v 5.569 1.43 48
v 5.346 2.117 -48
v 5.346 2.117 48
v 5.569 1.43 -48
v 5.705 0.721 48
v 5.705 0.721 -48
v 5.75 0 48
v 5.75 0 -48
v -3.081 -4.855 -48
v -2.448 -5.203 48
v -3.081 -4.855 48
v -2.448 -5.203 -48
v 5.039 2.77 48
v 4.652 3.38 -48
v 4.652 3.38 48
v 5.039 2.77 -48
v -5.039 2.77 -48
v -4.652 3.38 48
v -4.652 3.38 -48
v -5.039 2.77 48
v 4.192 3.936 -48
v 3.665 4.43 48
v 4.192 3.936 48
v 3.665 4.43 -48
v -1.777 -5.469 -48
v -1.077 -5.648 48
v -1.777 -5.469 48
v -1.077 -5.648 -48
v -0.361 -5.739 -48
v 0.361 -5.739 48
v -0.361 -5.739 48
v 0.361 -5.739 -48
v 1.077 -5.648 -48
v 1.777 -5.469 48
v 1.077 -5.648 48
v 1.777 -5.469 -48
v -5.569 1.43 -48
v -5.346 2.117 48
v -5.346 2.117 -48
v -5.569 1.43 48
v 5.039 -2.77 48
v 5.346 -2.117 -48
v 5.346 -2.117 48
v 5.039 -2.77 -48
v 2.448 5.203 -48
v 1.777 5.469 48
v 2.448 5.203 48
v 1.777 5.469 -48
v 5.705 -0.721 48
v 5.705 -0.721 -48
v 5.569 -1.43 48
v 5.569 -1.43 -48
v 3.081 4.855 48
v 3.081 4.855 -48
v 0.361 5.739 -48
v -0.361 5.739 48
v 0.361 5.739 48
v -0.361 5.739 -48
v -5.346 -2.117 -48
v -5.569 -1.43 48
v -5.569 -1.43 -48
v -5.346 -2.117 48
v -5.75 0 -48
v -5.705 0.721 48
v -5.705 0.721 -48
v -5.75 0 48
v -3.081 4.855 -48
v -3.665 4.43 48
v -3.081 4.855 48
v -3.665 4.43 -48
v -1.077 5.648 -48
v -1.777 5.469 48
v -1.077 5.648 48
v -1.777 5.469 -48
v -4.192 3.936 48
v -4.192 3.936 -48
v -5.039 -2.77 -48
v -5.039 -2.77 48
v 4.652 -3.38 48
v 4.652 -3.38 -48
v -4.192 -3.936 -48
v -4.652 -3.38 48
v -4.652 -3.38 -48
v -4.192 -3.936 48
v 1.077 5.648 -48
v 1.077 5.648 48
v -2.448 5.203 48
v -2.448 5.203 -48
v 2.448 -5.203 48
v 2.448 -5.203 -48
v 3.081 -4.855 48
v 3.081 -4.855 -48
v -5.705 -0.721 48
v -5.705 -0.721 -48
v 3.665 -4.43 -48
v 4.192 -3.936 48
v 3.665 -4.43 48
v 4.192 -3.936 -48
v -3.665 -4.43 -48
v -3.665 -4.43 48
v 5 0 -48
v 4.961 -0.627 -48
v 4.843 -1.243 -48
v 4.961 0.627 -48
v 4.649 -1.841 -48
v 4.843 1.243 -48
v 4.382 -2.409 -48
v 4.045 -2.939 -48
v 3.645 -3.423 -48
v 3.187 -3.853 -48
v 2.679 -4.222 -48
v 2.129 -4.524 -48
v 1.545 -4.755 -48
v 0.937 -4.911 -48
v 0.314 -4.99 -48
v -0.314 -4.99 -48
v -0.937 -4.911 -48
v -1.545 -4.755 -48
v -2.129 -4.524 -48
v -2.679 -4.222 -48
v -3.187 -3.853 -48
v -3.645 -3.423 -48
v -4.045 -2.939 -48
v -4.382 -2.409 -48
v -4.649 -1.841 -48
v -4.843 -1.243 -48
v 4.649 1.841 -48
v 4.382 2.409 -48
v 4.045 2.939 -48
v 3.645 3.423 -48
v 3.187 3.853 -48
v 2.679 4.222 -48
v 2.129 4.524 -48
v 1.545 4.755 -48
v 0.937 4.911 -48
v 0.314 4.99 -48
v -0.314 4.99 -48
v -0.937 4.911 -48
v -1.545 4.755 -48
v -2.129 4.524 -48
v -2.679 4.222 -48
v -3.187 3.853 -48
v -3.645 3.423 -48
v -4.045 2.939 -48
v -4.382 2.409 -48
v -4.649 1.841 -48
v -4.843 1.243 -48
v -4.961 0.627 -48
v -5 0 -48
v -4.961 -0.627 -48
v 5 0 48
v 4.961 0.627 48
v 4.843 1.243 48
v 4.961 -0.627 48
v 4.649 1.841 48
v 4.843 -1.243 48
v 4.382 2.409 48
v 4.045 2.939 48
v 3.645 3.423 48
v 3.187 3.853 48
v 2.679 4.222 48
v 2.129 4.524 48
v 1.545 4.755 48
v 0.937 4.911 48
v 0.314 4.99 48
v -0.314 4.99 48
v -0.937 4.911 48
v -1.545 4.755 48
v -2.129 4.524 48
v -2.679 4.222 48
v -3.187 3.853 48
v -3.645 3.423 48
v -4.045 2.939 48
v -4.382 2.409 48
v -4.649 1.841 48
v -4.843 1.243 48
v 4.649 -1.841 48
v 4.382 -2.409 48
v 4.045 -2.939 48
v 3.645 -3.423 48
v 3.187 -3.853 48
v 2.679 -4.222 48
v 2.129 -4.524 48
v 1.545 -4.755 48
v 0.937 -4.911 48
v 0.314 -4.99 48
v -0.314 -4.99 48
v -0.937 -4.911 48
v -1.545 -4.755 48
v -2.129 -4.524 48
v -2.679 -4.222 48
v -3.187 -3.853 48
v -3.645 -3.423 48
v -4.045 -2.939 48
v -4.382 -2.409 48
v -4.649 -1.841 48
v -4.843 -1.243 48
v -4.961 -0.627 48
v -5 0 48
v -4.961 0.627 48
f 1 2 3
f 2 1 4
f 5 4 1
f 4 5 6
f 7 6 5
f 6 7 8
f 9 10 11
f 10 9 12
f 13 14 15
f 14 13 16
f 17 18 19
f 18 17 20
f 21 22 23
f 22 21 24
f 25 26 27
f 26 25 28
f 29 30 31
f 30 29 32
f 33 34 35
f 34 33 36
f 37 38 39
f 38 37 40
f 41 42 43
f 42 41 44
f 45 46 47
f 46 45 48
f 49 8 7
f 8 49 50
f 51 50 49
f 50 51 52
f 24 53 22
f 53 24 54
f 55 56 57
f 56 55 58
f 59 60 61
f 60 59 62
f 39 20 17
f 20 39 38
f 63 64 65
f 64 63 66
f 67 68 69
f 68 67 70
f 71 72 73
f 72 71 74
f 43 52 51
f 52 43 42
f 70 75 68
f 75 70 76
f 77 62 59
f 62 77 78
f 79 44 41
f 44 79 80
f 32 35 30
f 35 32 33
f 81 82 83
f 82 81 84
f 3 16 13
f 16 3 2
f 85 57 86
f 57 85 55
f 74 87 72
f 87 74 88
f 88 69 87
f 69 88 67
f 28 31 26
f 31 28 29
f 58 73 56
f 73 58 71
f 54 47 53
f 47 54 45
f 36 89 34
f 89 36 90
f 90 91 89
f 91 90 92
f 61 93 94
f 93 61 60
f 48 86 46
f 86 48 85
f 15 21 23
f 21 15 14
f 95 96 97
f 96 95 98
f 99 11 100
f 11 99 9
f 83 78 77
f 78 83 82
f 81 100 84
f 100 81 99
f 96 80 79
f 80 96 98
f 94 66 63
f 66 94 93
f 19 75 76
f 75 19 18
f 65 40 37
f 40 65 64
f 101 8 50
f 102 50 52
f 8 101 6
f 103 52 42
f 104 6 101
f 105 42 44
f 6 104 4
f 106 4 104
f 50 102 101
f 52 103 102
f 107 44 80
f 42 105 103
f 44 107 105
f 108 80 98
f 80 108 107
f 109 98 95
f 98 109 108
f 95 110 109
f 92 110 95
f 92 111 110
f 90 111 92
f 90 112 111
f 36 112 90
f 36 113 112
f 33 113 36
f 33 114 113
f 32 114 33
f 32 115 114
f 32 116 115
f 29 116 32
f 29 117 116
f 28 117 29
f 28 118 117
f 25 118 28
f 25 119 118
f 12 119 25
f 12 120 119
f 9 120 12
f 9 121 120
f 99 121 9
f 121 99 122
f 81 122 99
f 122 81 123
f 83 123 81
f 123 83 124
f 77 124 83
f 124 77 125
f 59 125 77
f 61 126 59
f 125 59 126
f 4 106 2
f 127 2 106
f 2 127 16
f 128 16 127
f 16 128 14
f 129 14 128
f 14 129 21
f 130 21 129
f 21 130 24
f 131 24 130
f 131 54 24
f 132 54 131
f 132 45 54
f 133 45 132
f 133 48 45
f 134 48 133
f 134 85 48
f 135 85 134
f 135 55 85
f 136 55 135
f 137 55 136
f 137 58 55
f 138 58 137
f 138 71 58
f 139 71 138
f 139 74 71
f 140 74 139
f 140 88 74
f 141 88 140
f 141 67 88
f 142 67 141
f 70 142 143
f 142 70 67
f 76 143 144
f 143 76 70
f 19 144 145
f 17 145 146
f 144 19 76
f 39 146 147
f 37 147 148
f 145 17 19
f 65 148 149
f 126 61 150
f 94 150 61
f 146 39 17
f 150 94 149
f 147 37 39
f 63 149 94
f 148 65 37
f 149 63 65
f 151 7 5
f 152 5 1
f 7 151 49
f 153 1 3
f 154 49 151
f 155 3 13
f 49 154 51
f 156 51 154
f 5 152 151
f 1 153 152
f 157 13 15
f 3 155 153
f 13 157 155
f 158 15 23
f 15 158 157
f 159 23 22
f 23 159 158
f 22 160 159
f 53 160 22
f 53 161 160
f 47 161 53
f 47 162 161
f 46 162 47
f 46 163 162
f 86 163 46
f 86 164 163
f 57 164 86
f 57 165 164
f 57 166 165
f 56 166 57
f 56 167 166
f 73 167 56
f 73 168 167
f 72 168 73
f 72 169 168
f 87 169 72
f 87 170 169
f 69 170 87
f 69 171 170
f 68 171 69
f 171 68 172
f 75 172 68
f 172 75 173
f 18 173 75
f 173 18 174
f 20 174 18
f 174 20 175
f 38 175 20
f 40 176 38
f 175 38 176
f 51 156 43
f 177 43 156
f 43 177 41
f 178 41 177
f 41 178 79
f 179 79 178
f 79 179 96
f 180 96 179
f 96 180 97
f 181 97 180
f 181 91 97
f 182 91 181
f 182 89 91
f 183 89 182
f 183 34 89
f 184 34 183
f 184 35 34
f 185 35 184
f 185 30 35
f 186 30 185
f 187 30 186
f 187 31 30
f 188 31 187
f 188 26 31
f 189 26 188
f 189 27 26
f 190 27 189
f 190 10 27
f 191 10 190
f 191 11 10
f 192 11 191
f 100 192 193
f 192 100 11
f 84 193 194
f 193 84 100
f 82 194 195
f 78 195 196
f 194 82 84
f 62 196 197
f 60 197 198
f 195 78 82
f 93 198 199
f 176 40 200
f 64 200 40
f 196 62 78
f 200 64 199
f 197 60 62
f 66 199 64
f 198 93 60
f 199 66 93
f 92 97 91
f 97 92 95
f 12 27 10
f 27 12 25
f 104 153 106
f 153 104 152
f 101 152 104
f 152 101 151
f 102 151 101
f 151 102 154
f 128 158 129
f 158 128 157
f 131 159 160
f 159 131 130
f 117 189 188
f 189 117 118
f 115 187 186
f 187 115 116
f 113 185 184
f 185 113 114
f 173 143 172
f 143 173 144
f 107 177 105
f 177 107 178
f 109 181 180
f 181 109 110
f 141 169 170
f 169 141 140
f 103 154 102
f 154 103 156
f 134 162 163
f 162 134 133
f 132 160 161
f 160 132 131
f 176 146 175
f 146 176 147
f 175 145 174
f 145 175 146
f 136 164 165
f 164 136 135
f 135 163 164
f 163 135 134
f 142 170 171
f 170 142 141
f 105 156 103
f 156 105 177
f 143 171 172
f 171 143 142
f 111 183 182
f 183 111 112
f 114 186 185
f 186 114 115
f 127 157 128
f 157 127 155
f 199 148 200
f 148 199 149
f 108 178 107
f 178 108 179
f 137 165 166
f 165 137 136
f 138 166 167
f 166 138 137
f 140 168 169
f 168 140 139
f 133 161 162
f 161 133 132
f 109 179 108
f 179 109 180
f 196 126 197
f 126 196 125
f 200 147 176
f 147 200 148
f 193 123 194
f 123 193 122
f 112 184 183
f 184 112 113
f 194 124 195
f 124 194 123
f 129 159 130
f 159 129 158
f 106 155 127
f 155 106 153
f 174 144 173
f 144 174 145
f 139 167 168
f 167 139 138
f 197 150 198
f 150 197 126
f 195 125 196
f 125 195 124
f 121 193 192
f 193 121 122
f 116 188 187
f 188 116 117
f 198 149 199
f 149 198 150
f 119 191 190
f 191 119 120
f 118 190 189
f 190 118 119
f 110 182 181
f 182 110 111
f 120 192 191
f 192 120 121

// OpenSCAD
$fn = 50;


difference() {
	union() {
		translate(v = [0, 0, -48.0000000000]) {
			cylinder(h = 96, r = 5.7500000000);
		}
	}
	union() {
		translate(v = [0, 0, -100.0000000000]) {
			cylinder(h = 200, r = 5.0000000000);
		}
	}
}
